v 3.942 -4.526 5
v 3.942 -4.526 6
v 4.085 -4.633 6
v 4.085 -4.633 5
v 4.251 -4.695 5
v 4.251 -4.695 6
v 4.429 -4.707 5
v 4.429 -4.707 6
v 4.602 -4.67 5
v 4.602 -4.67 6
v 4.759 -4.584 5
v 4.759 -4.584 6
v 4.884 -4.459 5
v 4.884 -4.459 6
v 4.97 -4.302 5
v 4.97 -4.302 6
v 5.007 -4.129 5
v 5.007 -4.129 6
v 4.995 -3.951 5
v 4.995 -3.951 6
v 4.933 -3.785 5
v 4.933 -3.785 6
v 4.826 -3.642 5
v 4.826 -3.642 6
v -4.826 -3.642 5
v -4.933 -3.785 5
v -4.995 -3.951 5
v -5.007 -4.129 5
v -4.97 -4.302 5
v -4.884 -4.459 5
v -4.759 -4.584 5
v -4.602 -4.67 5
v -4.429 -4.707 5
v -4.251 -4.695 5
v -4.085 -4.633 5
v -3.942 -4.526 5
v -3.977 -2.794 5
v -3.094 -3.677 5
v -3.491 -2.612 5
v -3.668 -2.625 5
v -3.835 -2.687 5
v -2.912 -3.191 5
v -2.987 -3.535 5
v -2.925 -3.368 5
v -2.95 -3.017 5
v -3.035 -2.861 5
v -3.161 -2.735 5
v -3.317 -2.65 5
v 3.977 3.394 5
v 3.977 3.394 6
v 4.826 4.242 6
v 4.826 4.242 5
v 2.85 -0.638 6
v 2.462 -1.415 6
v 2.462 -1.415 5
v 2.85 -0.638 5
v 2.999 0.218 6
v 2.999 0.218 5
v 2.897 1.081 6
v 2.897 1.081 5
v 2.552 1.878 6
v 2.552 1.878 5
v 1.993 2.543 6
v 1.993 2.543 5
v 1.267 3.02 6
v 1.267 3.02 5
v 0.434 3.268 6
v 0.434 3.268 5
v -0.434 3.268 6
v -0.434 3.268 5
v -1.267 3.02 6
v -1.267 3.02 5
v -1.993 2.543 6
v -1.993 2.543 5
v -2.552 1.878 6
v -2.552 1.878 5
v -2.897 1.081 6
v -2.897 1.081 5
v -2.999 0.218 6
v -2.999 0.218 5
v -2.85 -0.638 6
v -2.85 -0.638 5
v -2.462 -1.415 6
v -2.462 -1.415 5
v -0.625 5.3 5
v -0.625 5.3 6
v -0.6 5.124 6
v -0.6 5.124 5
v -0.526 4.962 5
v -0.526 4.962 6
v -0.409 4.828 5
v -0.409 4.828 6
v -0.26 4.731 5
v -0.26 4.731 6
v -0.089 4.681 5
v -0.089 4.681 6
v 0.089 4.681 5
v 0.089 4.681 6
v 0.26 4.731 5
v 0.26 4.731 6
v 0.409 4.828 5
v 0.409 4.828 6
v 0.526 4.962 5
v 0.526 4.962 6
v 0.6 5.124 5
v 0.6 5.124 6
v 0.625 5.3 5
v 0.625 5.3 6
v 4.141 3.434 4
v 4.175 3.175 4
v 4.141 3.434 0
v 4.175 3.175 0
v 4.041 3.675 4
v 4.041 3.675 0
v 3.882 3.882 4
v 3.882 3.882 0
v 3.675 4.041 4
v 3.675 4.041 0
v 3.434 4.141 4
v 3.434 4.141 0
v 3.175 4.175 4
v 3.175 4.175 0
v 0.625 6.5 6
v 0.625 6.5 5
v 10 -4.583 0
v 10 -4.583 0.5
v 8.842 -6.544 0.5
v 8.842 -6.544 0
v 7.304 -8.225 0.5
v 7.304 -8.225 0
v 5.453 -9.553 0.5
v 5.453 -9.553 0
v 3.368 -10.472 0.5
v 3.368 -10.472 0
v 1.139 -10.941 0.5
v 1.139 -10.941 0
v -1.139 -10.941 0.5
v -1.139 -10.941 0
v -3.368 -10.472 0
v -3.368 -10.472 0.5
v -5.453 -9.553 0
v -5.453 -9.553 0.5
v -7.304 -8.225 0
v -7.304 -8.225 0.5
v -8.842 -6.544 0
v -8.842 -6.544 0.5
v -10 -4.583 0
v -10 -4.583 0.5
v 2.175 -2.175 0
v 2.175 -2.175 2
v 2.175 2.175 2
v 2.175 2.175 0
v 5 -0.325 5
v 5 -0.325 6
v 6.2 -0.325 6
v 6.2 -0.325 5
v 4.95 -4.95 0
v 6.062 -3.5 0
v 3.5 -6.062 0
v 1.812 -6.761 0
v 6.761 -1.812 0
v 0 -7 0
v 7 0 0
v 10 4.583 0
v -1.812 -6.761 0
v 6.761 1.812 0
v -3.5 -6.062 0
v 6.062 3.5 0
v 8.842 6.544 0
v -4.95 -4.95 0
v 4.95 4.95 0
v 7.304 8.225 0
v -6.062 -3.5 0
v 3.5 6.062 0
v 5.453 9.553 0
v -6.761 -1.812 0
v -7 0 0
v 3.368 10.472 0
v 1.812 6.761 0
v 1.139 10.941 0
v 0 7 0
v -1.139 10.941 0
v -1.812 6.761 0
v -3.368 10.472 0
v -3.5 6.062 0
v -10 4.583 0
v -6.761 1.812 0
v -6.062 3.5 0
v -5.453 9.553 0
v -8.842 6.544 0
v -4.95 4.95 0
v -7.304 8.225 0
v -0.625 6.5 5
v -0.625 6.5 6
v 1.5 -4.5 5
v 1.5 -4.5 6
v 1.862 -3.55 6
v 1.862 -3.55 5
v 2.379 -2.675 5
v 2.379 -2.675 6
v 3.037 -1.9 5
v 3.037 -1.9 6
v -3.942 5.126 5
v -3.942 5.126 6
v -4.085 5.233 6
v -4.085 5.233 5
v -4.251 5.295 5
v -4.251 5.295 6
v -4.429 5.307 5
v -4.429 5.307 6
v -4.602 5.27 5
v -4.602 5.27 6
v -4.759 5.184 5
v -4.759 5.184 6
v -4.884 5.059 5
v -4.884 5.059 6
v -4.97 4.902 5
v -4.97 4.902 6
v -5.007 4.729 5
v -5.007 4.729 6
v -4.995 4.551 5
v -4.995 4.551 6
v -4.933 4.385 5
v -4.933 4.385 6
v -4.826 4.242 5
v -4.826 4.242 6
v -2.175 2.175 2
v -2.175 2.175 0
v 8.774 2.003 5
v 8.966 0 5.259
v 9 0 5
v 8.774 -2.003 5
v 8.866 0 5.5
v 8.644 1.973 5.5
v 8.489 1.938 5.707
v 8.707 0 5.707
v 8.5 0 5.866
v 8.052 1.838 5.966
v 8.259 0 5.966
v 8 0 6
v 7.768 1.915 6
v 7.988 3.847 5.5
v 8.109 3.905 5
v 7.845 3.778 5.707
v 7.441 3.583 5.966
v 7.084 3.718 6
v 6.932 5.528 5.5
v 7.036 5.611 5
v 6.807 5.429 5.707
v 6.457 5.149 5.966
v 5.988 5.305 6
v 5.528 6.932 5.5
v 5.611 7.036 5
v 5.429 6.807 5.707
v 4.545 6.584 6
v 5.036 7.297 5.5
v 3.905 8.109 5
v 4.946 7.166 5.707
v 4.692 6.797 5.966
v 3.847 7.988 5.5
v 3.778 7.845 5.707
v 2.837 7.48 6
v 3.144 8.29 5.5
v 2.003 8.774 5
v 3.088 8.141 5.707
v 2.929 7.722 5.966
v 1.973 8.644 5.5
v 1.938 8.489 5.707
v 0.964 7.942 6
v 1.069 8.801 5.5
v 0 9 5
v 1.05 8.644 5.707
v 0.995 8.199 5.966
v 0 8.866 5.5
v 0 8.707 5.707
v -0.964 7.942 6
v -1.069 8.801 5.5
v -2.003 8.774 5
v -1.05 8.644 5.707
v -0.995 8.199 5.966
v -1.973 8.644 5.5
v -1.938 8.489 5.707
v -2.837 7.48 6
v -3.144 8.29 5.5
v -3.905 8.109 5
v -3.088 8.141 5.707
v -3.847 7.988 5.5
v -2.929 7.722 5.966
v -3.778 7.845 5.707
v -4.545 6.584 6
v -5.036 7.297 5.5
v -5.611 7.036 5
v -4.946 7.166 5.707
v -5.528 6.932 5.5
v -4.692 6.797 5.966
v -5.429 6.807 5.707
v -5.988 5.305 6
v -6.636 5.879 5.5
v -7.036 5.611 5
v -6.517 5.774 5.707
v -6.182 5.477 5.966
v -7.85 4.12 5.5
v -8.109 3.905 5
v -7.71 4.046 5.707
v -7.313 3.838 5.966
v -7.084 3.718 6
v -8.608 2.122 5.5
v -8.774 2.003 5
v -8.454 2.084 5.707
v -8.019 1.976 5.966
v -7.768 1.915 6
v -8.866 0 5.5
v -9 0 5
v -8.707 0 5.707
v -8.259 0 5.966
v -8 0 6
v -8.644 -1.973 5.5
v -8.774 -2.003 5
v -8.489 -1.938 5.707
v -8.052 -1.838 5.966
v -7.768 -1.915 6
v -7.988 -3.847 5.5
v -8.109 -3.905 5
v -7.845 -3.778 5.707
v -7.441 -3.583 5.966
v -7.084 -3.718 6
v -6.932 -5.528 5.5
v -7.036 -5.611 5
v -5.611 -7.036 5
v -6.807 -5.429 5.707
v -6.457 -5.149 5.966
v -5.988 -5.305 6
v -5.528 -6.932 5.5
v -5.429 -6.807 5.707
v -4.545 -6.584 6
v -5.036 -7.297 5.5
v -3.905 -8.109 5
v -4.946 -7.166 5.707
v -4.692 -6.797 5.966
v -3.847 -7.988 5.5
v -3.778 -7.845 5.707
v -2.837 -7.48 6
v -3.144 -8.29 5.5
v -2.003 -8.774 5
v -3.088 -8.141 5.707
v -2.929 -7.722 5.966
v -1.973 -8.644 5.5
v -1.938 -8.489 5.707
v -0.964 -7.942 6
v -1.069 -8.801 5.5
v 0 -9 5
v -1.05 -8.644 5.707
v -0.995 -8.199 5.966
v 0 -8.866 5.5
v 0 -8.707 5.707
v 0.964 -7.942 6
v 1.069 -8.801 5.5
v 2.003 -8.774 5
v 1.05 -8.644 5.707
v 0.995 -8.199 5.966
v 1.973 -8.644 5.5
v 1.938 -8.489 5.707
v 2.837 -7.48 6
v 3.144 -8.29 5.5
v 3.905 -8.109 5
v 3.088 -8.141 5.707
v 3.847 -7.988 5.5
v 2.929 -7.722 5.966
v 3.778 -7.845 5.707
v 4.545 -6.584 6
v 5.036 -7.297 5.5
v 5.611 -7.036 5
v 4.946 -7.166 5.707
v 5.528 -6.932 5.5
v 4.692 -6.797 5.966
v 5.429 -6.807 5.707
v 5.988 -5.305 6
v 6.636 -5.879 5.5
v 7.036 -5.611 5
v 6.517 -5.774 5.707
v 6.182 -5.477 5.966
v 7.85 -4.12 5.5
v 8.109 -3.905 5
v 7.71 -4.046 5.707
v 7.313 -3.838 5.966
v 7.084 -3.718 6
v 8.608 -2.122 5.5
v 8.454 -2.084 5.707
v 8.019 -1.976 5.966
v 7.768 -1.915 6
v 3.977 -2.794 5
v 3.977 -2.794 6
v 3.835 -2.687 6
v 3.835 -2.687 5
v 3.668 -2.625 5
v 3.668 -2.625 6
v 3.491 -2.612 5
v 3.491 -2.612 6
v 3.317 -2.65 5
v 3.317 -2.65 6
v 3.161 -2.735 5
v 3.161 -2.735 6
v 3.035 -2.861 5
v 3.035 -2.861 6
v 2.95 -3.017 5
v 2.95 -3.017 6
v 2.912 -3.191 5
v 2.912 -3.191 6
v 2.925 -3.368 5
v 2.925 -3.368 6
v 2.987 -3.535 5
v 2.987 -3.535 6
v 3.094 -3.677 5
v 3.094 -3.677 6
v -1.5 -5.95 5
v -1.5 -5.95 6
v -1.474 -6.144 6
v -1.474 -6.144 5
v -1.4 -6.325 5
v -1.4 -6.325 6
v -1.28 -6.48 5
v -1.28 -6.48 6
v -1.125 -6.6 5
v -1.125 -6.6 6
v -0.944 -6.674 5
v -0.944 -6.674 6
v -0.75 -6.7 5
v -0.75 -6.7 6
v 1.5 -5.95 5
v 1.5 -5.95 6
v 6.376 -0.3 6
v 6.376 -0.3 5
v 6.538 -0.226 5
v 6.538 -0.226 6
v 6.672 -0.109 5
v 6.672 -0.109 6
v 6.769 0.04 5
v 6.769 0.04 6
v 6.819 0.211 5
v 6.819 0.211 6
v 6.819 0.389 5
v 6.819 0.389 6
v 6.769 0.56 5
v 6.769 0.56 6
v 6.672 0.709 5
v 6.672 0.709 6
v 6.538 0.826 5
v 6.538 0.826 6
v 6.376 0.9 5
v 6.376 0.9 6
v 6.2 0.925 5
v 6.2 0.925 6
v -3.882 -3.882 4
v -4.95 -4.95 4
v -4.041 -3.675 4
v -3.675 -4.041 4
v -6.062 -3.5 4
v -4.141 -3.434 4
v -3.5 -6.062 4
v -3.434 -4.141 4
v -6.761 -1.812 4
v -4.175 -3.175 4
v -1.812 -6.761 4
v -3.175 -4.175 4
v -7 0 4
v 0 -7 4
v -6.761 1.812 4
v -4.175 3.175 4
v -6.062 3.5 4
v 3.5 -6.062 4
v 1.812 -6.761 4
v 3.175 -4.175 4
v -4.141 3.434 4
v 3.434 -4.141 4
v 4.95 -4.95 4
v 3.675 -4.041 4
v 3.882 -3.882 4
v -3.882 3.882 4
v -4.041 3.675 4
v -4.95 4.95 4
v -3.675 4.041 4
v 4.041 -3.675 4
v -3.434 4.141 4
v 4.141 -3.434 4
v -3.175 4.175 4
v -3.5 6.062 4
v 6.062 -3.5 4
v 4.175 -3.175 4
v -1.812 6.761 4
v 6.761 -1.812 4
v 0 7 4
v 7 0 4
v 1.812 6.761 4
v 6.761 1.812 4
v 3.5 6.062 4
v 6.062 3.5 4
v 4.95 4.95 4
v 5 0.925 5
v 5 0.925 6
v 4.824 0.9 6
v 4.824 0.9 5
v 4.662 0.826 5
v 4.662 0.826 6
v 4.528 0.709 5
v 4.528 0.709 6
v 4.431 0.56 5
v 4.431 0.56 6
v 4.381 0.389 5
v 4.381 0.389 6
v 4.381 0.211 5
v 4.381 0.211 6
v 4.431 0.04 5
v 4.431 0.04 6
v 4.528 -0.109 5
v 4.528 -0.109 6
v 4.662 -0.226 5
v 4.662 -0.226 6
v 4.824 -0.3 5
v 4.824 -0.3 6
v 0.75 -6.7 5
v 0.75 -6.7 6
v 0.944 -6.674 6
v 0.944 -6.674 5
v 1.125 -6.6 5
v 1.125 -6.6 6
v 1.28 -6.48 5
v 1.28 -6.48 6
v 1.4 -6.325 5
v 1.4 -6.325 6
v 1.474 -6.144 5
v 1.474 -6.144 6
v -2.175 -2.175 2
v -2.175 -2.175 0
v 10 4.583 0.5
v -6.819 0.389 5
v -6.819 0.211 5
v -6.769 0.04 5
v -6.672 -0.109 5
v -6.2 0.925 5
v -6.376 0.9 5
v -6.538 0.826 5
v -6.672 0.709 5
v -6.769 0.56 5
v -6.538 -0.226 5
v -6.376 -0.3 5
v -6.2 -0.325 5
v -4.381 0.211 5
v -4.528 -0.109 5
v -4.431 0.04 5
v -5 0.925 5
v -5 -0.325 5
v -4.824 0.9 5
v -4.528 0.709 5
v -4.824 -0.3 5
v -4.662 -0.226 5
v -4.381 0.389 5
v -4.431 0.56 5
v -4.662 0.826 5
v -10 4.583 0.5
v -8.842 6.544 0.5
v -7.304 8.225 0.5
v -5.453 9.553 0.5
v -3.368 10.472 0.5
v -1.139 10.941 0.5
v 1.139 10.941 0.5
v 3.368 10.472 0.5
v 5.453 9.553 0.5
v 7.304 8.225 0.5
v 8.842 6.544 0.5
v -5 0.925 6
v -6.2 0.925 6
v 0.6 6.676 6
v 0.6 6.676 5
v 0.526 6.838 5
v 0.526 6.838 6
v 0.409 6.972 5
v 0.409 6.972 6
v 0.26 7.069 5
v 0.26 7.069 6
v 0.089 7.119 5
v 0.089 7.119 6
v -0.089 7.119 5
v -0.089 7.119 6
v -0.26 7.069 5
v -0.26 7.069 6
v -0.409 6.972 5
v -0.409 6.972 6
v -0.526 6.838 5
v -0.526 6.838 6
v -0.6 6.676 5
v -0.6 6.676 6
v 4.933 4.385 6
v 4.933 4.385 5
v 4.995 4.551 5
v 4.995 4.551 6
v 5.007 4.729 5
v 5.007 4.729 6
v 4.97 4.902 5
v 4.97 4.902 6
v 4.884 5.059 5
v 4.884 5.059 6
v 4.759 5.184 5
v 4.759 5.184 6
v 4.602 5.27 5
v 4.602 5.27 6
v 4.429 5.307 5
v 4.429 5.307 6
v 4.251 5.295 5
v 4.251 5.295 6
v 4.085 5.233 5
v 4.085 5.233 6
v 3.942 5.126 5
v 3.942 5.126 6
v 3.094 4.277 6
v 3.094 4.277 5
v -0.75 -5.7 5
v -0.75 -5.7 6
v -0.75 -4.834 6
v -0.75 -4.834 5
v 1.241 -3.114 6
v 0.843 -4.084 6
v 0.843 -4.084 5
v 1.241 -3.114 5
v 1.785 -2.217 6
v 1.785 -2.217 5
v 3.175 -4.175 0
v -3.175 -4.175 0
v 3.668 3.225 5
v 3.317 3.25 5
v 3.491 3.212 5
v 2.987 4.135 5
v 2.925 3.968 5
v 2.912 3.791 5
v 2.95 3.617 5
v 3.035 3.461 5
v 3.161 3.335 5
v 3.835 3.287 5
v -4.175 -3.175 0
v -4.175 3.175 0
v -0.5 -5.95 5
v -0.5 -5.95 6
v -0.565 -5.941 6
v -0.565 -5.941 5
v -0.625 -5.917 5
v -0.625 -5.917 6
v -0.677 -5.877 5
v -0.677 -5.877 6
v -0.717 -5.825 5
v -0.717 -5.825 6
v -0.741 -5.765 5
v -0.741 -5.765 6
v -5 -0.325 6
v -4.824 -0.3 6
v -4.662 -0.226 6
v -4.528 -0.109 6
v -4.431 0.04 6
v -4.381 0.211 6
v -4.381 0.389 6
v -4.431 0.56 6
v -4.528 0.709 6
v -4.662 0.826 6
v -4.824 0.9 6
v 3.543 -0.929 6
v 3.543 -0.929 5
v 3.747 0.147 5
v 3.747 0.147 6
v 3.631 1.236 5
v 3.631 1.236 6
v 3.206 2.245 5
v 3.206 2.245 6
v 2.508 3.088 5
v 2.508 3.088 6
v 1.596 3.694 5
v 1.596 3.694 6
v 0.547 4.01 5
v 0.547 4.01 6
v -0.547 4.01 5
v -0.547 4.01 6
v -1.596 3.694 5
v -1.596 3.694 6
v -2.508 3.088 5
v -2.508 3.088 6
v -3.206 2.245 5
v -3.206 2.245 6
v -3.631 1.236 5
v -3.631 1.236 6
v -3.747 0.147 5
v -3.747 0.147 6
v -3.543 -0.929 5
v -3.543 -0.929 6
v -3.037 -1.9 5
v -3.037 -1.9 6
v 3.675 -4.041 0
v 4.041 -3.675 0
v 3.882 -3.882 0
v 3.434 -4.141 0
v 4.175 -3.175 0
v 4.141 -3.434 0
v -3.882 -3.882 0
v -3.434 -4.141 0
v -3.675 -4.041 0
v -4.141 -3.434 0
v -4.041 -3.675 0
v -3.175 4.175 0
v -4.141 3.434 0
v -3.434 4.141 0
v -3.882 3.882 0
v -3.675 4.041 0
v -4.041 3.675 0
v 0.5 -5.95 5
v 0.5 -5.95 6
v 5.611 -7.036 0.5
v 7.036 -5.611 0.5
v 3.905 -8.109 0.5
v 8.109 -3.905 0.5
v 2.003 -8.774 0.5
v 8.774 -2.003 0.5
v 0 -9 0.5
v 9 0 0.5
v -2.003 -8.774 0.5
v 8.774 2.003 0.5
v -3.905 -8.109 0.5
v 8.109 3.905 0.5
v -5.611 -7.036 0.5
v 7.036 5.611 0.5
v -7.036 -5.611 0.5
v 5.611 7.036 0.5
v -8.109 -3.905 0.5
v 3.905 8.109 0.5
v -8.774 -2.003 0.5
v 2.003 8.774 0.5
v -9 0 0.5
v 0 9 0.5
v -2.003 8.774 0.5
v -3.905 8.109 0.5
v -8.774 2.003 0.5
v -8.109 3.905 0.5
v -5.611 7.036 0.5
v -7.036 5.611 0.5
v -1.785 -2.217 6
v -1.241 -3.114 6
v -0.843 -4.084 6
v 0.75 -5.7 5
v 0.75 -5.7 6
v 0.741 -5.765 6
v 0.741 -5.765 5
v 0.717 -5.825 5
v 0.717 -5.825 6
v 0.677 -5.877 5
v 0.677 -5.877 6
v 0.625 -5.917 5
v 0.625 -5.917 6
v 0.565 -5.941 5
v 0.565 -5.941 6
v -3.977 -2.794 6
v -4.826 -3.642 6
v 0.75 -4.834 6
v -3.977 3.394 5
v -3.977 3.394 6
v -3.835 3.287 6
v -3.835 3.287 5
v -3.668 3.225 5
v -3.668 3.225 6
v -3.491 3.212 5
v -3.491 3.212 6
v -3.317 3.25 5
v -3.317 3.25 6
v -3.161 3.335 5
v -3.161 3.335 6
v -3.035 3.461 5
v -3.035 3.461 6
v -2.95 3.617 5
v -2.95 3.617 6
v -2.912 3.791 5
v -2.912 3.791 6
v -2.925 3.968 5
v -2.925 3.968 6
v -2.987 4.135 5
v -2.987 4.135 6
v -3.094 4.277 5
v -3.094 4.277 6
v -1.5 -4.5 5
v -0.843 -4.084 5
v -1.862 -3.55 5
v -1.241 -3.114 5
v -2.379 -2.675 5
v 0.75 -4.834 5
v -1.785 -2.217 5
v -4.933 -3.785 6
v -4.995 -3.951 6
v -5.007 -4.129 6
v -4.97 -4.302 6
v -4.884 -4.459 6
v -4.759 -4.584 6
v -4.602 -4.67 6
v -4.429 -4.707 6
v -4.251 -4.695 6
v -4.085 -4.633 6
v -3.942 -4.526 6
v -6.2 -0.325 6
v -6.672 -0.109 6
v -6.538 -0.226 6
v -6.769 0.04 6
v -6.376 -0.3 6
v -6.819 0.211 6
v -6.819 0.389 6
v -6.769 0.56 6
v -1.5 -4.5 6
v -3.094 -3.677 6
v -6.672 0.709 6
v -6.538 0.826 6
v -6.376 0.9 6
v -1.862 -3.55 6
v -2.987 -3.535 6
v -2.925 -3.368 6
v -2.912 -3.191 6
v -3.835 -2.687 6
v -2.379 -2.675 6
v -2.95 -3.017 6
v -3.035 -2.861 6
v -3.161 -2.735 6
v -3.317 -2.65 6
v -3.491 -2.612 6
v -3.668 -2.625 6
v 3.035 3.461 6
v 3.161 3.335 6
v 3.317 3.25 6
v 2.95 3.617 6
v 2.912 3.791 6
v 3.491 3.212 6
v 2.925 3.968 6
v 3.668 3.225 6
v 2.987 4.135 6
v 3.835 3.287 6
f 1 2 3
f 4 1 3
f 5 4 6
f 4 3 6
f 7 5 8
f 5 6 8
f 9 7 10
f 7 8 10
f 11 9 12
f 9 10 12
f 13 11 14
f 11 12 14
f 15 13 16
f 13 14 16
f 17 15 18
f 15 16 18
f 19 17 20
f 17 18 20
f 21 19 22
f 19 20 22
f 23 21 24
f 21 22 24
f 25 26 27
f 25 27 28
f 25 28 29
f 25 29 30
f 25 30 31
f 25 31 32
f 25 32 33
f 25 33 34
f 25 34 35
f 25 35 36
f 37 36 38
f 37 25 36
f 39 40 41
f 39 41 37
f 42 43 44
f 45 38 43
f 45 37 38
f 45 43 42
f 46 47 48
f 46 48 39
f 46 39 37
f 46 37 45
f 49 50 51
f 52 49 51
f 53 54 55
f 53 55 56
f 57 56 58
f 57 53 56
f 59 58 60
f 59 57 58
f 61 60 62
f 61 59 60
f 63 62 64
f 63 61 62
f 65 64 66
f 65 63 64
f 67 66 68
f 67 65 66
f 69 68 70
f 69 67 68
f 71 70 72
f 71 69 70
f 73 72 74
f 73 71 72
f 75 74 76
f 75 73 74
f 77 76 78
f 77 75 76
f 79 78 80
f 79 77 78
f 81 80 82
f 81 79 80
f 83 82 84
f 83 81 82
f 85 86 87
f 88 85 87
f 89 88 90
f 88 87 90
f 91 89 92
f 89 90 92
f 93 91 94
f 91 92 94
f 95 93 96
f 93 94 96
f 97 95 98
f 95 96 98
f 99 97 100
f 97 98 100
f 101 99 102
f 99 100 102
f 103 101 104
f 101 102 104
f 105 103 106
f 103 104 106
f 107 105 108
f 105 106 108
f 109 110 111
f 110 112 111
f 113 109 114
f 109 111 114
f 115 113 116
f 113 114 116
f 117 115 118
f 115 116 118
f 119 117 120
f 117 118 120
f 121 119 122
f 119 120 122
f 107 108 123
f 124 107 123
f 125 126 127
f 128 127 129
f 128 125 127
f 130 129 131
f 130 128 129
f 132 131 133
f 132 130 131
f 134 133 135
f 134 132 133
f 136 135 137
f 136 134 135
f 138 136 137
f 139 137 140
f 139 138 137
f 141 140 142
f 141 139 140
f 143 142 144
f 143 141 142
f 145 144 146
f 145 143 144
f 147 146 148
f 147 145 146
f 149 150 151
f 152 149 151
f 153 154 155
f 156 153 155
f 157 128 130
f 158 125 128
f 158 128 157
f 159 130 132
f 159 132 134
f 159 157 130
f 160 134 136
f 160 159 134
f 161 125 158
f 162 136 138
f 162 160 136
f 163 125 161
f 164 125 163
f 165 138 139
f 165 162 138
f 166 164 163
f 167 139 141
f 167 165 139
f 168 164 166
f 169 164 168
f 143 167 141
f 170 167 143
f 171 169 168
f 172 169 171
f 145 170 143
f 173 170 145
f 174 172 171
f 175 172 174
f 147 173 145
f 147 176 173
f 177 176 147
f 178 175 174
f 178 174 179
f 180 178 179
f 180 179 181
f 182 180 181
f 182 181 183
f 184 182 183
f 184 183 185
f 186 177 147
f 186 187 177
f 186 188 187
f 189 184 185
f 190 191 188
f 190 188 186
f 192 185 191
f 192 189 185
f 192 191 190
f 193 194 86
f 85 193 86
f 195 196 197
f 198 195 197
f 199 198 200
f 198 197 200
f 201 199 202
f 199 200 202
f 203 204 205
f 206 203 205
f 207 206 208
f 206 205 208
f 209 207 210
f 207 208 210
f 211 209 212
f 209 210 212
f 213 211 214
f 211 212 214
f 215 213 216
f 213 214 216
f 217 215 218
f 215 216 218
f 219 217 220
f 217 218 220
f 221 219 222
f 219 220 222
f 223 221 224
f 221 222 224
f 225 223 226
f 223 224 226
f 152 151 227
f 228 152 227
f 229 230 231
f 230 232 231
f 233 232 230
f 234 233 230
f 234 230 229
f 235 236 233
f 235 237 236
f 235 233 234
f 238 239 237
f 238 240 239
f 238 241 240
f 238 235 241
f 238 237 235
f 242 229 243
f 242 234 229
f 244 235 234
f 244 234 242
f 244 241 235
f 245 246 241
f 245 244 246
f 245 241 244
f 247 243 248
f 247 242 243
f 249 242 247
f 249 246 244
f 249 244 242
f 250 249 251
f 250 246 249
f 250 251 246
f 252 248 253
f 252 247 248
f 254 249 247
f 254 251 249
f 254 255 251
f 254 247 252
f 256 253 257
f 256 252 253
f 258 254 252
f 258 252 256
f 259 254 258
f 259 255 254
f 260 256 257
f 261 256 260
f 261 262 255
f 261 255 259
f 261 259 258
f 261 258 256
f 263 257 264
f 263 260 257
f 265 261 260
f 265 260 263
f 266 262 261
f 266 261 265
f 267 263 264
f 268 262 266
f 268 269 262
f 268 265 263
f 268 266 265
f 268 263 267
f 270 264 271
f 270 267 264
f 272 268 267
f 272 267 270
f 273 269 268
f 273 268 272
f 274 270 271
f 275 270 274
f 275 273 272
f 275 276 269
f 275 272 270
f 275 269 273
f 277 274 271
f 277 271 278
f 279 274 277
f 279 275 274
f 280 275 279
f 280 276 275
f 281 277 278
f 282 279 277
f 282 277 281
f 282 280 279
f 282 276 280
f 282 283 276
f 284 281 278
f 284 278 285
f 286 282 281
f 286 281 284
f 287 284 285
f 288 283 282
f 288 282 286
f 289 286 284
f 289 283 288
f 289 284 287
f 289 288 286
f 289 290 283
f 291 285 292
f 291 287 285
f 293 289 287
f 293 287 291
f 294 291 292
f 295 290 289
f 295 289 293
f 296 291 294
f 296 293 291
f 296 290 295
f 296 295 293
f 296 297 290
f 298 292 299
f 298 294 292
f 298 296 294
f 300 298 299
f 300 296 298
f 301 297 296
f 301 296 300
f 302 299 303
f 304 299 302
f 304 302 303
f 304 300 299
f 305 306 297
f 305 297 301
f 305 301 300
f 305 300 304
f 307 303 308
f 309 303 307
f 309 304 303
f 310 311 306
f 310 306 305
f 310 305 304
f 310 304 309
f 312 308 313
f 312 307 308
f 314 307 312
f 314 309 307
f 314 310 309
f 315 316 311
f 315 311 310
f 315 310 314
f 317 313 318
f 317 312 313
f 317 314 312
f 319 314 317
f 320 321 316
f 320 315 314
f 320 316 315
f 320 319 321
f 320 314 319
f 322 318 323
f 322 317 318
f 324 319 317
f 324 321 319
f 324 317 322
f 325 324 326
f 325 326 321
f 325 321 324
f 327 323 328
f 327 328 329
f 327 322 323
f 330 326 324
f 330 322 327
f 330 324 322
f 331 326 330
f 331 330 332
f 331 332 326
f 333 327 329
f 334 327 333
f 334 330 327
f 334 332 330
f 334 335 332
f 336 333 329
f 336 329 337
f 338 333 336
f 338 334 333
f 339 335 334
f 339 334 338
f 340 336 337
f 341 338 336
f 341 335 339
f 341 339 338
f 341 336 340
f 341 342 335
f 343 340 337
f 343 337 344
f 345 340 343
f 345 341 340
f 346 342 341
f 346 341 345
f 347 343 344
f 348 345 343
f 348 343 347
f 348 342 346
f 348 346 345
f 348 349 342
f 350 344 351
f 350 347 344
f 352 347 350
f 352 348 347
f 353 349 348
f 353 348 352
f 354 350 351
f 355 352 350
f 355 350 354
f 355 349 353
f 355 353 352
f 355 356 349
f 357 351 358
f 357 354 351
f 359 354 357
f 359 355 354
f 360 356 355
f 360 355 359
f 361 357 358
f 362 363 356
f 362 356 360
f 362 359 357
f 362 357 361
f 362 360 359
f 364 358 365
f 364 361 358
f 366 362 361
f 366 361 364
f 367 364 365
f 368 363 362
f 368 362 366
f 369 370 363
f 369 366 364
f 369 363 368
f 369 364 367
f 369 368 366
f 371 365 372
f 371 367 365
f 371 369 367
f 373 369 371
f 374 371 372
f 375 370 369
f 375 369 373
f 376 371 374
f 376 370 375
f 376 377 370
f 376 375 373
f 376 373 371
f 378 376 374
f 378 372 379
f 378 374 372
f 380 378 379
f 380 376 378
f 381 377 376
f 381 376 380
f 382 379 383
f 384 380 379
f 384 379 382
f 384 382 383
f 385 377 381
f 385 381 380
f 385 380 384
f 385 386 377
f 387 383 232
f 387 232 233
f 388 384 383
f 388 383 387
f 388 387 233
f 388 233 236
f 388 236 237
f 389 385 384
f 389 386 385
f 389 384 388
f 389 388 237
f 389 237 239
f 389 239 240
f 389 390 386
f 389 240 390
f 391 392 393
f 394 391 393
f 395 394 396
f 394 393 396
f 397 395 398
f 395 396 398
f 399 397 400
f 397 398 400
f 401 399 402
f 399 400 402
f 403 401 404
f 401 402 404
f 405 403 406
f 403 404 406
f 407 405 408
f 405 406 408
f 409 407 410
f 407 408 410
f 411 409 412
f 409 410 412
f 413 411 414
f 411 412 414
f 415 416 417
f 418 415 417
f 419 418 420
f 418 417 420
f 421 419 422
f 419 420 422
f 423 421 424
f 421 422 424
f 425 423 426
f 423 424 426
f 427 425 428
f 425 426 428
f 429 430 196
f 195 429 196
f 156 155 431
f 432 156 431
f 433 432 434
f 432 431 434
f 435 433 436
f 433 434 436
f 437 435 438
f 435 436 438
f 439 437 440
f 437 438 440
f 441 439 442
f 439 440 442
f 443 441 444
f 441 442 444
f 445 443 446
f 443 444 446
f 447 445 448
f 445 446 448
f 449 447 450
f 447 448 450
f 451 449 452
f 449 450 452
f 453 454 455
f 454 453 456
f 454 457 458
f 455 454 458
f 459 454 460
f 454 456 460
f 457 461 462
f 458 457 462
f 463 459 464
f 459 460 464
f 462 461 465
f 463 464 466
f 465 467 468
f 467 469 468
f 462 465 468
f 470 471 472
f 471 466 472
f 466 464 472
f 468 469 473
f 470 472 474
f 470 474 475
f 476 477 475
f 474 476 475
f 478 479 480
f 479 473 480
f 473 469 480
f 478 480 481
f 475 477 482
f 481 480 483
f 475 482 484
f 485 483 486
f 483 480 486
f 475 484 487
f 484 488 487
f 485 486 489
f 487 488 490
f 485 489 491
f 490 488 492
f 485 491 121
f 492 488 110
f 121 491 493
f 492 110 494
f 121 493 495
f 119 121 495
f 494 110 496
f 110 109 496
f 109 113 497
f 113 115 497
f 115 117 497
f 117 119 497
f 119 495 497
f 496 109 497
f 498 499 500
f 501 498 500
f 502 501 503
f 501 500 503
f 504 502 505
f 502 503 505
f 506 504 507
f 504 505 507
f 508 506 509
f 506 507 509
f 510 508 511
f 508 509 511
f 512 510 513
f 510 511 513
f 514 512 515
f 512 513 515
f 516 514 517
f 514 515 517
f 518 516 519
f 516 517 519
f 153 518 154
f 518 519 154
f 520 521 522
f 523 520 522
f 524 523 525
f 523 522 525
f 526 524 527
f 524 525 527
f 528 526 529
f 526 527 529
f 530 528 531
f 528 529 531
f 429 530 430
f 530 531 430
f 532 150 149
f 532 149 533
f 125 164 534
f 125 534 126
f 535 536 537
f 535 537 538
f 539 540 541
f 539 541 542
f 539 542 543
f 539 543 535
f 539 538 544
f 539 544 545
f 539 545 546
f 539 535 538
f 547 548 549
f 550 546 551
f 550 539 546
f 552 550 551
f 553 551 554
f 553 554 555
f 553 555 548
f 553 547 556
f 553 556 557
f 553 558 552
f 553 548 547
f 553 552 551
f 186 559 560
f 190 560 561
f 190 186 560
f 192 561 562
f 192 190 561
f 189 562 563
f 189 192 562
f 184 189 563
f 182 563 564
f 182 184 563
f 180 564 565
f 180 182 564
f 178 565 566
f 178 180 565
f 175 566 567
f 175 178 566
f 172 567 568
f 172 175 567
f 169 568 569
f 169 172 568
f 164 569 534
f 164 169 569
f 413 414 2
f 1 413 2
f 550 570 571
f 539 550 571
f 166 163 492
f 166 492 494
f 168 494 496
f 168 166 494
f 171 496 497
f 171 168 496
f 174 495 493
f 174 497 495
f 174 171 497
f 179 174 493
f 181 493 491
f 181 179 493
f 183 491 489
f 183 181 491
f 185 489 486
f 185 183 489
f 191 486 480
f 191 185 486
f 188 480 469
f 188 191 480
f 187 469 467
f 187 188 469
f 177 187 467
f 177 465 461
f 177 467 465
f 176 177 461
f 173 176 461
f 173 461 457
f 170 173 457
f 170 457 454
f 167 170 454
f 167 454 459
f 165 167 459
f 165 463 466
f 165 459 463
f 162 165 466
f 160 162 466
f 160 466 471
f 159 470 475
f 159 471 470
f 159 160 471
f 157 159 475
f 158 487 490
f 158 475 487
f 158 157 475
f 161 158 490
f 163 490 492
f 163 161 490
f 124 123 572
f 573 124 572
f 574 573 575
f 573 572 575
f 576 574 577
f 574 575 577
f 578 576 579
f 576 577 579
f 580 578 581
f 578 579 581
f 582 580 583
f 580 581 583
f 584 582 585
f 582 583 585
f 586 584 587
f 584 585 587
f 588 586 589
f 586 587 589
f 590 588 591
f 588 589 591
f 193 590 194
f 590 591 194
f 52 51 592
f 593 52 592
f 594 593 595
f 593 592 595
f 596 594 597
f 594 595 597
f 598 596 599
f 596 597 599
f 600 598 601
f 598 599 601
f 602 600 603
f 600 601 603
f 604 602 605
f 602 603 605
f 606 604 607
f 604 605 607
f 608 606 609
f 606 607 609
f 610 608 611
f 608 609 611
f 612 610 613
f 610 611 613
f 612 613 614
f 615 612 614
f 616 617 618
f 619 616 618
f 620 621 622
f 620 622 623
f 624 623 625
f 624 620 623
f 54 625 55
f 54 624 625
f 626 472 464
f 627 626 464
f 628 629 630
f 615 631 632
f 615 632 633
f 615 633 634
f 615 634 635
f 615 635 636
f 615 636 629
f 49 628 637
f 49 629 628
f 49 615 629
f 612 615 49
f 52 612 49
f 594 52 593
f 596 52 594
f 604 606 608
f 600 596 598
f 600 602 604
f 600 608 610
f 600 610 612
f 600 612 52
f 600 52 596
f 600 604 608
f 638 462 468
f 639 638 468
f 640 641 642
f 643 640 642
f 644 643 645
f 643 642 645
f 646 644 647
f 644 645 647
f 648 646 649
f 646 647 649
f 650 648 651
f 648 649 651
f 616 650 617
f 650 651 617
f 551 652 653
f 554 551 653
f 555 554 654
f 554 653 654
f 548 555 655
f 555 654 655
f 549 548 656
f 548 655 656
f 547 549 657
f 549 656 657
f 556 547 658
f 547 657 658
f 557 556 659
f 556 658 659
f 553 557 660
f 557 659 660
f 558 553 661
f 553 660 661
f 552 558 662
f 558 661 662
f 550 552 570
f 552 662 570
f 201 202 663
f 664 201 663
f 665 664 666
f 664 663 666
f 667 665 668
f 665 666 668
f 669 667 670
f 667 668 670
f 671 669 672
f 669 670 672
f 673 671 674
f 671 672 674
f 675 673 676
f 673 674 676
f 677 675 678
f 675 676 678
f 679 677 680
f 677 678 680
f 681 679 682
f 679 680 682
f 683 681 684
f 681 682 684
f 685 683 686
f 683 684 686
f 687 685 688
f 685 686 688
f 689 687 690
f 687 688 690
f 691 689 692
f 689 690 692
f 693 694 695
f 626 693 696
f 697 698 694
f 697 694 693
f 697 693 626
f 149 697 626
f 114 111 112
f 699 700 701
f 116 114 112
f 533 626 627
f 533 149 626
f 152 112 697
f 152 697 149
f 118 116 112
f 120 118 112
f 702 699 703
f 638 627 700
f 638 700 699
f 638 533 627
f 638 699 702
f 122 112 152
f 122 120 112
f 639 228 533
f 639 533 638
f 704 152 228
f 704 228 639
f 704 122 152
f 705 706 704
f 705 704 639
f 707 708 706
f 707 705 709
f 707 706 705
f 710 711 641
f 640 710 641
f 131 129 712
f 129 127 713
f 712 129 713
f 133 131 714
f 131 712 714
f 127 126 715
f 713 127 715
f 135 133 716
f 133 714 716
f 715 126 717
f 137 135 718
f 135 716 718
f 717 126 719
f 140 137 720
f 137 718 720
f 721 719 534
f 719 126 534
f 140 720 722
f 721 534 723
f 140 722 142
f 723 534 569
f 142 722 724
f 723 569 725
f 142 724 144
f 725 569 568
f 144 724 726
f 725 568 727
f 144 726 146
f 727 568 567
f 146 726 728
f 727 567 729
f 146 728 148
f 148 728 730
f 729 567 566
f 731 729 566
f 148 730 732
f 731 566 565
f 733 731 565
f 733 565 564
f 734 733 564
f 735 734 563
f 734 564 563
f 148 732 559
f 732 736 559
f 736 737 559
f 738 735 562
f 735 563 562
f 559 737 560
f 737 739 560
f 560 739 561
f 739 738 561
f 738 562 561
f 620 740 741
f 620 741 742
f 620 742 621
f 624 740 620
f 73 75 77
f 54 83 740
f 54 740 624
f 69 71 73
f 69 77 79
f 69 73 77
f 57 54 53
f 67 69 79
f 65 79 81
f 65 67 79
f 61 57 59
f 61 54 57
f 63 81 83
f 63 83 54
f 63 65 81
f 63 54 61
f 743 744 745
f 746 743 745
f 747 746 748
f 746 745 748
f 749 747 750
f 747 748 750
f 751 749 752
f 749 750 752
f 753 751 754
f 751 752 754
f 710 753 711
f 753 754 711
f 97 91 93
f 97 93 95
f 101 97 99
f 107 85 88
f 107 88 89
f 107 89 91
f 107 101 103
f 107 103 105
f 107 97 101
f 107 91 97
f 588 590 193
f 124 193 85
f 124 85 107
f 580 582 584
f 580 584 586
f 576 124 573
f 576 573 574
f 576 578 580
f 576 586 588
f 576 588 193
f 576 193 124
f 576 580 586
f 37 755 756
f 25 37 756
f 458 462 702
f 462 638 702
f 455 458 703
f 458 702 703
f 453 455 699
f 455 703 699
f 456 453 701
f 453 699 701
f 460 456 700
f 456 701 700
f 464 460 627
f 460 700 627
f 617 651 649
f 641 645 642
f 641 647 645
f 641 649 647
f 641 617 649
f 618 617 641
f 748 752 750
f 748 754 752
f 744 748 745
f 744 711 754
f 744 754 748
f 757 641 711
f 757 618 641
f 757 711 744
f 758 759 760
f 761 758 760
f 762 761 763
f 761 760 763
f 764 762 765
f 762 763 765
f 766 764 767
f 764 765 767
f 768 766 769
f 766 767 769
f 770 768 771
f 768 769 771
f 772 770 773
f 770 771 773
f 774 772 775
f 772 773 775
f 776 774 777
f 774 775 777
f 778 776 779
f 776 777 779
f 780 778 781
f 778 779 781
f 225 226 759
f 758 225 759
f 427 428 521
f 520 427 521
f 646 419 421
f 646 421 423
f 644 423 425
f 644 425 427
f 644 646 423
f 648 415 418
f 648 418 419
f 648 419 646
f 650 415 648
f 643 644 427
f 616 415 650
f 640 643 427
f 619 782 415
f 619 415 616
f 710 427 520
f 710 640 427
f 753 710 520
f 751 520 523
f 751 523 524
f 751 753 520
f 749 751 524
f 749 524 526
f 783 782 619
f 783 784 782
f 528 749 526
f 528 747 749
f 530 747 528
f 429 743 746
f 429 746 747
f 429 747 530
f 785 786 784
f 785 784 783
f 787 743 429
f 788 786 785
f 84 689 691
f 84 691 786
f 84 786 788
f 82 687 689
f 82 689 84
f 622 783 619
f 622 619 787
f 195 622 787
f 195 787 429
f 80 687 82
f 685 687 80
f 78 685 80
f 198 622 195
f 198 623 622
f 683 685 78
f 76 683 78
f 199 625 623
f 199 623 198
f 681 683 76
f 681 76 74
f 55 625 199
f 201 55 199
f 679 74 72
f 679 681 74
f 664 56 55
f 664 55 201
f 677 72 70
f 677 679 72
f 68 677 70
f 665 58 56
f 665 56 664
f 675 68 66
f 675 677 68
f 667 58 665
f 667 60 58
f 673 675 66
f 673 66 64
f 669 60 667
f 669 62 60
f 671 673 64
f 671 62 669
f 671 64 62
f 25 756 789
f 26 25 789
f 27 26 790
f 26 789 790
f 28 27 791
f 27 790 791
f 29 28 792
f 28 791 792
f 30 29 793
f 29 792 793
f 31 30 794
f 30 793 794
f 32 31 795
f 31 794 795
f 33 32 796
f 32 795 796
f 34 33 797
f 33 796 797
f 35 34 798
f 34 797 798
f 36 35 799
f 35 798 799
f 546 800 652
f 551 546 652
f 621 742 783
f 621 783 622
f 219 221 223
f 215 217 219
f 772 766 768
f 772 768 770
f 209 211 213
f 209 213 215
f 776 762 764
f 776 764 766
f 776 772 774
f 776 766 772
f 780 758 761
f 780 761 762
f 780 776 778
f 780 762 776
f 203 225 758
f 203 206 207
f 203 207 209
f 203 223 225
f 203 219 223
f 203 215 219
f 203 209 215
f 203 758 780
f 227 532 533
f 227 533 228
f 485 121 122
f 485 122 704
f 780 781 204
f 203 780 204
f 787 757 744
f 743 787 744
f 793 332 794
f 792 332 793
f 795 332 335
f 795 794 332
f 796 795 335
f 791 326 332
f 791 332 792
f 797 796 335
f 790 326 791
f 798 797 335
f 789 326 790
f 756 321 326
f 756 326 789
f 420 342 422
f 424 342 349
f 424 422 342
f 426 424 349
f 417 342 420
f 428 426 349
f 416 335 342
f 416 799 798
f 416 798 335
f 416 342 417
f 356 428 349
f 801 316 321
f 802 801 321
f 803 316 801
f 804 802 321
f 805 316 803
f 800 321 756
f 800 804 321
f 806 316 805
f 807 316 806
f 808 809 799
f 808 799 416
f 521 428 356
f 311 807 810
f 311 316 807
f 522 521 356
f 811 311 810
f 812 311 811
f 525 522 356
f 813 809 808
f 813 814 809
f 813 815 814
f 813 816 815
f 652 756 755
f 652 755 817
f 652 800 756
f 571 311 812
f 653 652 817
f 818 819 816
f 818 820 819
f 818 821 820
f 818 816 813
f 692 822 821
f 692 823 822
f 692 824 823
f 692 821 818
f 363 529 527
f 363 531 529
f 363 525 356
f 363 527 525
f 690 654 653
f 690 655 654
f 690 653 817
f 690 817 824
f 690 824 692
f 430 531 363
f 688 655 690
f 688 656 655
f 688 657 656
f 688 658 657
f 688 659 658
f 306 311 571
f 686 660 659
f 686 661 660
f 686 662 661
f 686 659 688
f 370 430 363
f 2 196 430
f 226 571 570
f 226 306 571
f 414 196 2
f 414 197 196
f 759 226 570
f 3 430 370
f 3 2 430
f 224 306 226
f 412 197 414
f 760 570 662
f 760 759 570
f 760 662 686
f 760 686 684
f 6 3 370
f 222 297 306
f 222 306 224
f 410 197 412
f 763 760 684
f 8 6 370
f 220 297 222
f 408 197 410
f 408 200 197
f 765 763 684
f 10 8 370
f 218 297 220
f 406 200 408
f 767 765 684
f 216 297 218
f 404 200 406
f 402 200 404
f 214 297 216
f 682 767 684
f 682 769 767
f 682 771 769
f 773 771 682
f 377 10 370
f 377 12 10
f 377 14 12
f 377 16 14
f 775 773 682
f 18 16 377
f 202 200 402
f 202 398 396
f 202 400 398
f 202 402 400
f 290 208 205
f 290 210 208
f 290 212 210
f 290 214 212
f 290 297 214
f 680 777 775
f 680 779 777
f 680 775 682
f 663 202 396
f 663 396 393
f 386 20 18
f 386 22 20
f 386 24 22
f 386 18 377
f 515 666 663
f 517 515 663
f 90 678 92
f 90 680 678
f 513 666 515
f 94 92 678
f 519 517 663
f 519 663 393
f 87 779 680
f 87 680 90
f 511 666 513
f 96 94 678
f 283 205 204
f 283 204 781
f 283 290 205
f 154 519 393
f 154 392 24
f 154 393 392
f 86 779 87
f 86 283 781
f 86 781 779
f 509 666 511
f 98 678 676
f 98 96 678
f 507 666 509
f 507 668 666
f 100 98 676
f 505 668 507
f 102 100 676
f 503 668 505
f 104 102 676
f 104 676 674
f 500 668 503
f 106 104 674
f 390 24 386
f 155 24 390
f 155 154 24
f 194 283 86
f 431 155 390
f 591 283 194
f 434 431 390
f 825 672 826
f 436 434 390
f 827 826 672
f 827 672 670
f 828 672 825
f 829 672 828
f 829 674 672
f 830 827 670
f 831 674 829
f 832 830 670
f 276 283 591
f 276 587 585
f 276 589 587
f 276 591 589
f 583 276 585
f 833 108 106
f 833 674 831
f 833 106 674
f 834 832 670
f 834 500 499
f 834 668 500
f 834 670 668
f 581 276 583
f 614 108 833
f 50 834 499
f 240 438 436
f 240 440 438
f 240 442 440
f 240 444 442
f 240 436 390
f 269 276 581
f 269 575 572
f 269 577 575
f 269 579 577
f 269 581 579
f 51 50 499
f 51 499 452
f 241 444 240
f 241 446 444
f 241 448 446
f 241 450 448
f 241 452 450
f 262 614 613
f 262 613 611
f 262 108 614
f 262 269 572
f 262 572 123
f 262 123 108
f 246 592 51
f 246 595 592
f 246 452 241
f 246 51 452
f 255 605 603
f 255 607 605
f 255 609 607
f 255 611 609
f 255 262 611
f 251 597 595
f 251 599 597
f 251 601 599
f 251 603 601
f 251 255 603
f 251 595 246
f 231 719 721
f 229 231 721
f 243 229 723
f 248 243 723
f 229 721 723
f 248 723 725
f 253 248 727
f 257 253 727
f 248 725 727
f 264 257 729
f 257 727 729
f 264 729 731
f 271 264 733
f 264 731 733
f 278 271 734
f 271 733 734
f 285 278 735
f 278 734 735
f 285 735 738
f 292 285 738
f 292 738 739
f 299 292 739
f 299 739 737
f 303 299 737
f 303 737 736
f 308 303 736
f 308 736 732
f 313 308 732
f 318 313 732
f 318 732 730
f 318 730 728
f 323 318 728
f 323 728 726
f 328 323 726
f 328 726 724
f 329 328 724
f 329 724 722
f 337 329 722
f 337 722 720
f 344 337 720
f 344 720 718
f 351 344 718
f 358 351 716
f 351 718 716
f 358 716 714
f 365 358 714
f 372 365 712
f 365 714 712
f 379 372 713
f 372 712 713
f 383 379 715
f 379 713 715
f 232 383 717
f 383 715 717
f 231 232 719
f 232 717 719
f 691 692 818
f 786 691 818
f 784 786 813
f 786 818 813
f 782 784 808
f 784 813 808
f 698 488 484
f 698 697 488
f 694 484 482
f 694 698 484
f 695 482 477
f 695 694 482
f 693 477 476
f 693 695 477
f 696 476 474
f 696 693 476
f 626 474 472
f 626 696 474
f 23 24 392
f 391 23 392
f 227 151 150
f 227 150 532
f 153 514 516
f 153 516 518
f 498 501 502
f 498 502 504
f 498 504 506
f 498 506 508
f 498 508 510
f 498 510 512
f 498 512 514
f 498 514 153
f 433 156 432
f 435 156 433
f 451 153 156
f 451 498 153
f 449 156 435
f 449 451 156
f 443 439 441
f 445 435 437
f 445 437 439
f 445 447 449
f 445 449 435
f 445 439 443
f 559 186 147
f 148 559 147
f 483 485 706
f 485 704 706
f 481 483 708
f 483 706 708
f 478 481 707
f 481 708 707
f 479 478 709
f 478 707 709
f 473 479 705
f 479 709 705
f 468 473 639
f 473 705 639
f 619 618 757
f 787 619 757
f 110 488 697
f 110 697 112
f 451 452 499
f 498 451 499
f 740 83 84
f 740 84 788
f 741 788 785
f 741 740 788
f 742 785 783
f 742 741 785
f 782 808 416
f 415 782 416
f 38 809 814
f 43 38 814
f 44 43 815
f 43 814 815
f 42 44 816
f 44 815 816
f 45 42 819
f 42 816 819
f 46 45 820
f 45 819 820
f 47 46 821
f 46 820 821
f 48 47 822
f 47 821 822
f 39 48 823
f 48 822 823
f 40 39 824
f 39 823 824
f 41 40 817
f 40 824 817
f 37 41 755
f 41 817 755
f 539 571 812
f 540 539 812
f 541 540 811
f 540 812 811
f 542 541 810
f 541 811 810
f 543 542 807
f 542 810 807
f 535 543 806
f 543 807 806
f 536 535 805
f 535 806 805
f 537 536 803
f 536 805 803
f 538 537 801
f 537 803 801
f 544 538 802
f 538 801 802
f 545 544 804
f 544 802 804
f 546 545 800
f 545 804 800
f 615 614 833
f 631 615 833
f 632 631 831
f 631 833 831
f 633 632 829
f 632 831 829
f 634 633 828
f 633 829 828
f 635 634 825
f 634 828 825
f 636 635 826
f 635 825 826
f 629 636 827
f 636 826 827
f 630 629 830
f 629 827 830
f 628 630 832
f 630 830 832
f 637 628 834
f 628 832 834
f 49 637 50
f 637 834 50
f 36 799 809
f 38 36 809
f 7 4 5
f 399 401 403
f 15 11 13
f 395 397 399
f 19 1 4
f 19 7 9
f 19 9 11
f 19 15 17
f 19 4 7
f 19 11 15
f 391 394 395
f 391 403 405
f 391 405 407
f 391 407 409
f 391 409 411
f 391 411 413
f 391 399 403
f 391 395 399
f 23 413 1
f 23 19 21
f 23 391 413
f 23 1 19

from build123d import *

# Parameters (mm, degrees)
ESBO_O1_R                = 9
RESSALTO_EXTRUS_O1_DEPTH = 6
FILETE1_R                = 1
CASCA1_T                 = -2
ESBO_O2_W                = 8.35
ESBO_O2_H                = 8.35
ESBO_O2_W_2              = 4.35
ESBO_O2_H_2              = 4.35
RESSALTO_EXTRUS_O2_DEPTH = 4
FILETE2_R                = 1
CORTE_EXTRUS_O2_DEPTH    = 1
ESBO_O6_R                = 11
ESBO_O6_R_2              = 9
RESSALTO_EXTRUS_O3_DEPTH = 0.5
CORTE_EXTRUS_O4_DEPTH    = 17.673332001
ESBO_O8_W                = 4.35
ESBO_O8_H                = 4.35
RESSALTO_EXTRUS_O4_DEPTH = 2


with BuildPart() as part:
    # Esboço1 → Ressalto-extrusão1 (new body)
    with BuildSketch(Plane.XY):
        Circle(ESBO_O1_R)
    extrude(amount=RESSALTO_EXTRUS_O1_DEPTH)

    # Filete1
    filete1_edges = [part.edges().sort_by_distance(p)[0] for p in [
        (-9, 0, 6),
    ]]
    fillet(filete1_edges, radius=FILETE1_R)

    # Casca1
    casca1_openings = [part.faces().sort_by_distance(p)[0] for p in [
        (0, 0, 0),
    ]]
    offset(amount=CASCA1_T, openings=casca1_openings, kind=Kind.INTERSECTION)

    # Esboço2 → Ressalto-extrusão2 (add)
    with BuildSketch(Plane(origin=(0, 0, 4), x_dir=(-1, 0, 0), z_dir=(0, 0, -1))):
        Rectangle(ESBO_O2_W, ESBO_O2_H)
        Rectangle(ESBO_O2_W_2, ESBO_O2_H_2, mode=Mode.SUBTRACT)
    extrude(amount=RESSALTO_EXTRUS_O2_DEPTH)

    # Filete2
    filete2_edges = [part.edges().sort_by_distance(p)[0] for p in [
        (-4.175, -4.175, 2),
        (-4.175, 4.175, 2),
        (4.175, 4.175, 2),
        (4.175, -4.175, 2),
    ]]
    fillet(filete2_edges, radius=FILETE2_R)

    # Esboço4 → Corte-extrusão2 (cut)
    # profile 1 of 8: a face of its own
    with BuildSketch(Plane.XY.offset(6)):
        with BuildLine():
            Line((-0.625, 6.5), (-0.625, 5.3))
            ThreePointArc((-0.625, 5.3), (0, 4.675), (0.625, 5.3))
            Line((0.625, 5.3), (0.625, 6.5))
            ThreePointArc((0.625, 6.5), (0, 7.125), (-0.625, 6.5))
        make_face()
    # profile 2 of 8: a face of its own
    with BuildSketch(Plane.XY.offset(6)):
        with BuildLine():
            Line((-1.5, -4.5), (-1.5, -5.95))
            ThreePointArc((-1.5, -5.95), (-1.280330086, -6.480330086), (-0.75, -6.7))
            Line((-0.75, -6.7), (0.75, -6.7))
            ThreePointArc((0.75, -6.7), (1.280330086, -6.480330086), (1.5, -5.95))
            Line((1.5, -5.95), (1.5, -4.5))
            ThreePointArc((1.5, -4.5), (2.102155122, -3.101716024), (3.036856928, -1.9))
            ThreePointArc((3.036856928, -1.9), (0, 4.05), (-3.036856928, -1.9))
            ThreePointArc((-3.036856928, -1.9), (-2.102155122, -3.101716024), (-1.5, -4.5))
        make_face()
        with BuildLine():
            Line((-0.842764128, -4.084062043), (0.842764128, -4.084062043))
            ThreePointArc((0.842764128, -4.084062043), (1.495755637, -2.654539881), (2.461620284, -1.414766916))
            ThreePointArc((2.461620284, -1.414766916), (0, 3.3), (-2.461620284, -1.414766916))
            ThreePointArc((-2.461620284, -1.414766916), (-1.495755637, -2.654539881), (-0.842764128, -4.084062043))
        make_face(mode=Mode.SUBTRACT)
        with BuildLine():
            Line((-0.75, -4.834062043), (0.75, -4.834062043))
            Line((0.75, -4.834062043), (0.75, -5.7))
            ThreePointArc((0.75, -5.7), (0.676776695, -5.876776695), (0.5, -5.95))
            Line((0.5, -5.95), (-0.5, -5.95))
            ThreePointArc((-0.5, -5.95), (-0.676776695, -5.876776695), (-0.75, -5.7))
            Line((-0.75, -5.7), (-0.75, -4.834062043))
        make_face(mode=Mode.SUBTRACT)
    # profile 3 of 8: a face of its own
    with BuildSketch(Plane.XY.offset(6)):
        with BuildLine():
            Line((3.942120305, 5.126003782), (3.093592168, 4.277475644))
            ThreePointArc((3.093592168, 4.277475644), (3.093592168, 3.393592168), (3.977475644, 3.393592168))
            Line((3.977475644, 3.393592168), (4.826003782, 4.242120305))
            ThreePointArc((4.826003782, 4.242120305), (4.826003782, 5.126003782), (3.942120305, 5.126003782))
        make_face()
    # profile 4 of 8: a face of its own
    with BuildSketch(Plane.XY.offset(6)):
        with BuildLine():
            Line((6.2, 0.925), (5, 0.925))
            ThreePointArc((5, 0.925), (4.375, 0.3), (5, -0.325))
            Line((5, -0.325), (6.2, -0.325))
            ThreePointArc((6.2, -0.325), (6.825, 0.3), (6.2, 0.925))
        make_face()
    # profile 5 of 8: a face of its own
    with BuildSketch(Plane.XY.offset(6)):
        with BuildLine():
            Line((4.826003782, -3.642120305), (3.977475644, -2.793592168))
            ThreePointArc((3.977475644, -2.793592168), (3.093592168, -2.793592168), (3.093592168, -3.677475644))
            Line((3.093592168, -3.677475644), (3.942120305, -4.526003782))
            ThreePointArc((3.942120305, -4.526003782), (4.826003782, -4.526003782), (4.826003782, -3.642120305))
        make_face()
    # profile 6 of 8: a face of its own
    with BuildSketch(Plane.XY.offset(6)):
        with BuildLine():
            Line((-3.942120305, -4.526003782), (-3.093592168, -3.677475644))
            ThreePointArc((-3.093592168, -3.677475644), (-3.093592168, -2.793592168), (-3.977475644, -2.793592168))
            Line((-3.977475644, -2.793592168), (-4.826003782, -3.642120305))
            ThreePointArc((-4.826003782, -3.642120305), (-4.826003782, -4.526003782), (-3.942120305, -4.526003782))
        make_face()
    # profile 7 of 8: a face of its own
    with BuildSketch(Plane.XY.offset(6)):
        with BuildLine():
            Line((-6.2, -0.325), (-5, -0.325))
            ThreePointArc((-5, -0.325), (-4.375, 0.3), (-5, 0.925))
            Line((-5, 0.925), (-6.2, 0.925))
            ThreePointArc((-6.2, 0.925), (-6.825, 0.3), (-6.2, -0.325))
        make_face()
    # profile 8 of 8: a face of its own
    with BuildSketch(Plane.XY.offset(6)):
        with BuildLine():
            Line((-4.826003782, 4.242120305), (-3.977475644, 3.393592168))
            ThreePointArc((-3.977475644, 3.393592168), (-3.093592168, 3.393592168), (-3.093592168, 4.277475644))
            Line((-3.093592168, 4.277475644), (-3.942120305, 5.126003782))
            ThreePointArc((-3.942120305, 5.126003782), (-4.826003782, 5.126003782), (-4.826003782, 4.242120305))
        make_face()
    extrude(amount=-CORTE_EXTRUS_O2_DEPTH, mode=Mode.SUBTRACT)

    # Esboço6 → Ressalto-extrusão3 (add)
    with BuildSketch(Plane(origin=(0, 0, 0), x_dir=(-1, 0, 0), z_dir=(0, 0, -1))):
        Circle(ESBO_O6_R)
        Circle(ESBO_O6_R_2, mode=Mode.SUBTRACT)
    extrude(amount=-RESSALTO_EXTRUS_O3_DEPTH)

    # Esboço7 → Corte-extrusão4 (cut, through all)
    with BuildSketch(Plane(origin=(0, 0, 0), x_dir=(-1, 0, 0), z_dir=(0, 0, -1))):
        with BuildLine():
            Line((-10, 4.582575695), (-10, -4.582575695))
            ThreePointArc((-10, -4.582575695), (-11, 0), (-10, 4.582575695))
        make_face()
        with BuildLine():
            Line((10, 4.582575695), (10, -4.582575695))
            ThreePointArc((10, -4.582575695), (11, 0), (10, 4.582575695))
        make_face()
    extrude(amount=-CORTE_EXTRUS_O4_DEPTH, mode=Mode.SUBTRACT)

    # Esboço8 → Ressalto-extrusão4 (add)
    with BuildSketch(Plane(origin=(0, 0, 4), x_dir=(-1, 0, 0), z_dir=(0, 0, -1))):
        Rectangle(ESBO_O8_W, ESBO_O8_H)
    extrude(amount=RESSALTO_EXTRUS_O4_DEPTH)


solid = part.part
